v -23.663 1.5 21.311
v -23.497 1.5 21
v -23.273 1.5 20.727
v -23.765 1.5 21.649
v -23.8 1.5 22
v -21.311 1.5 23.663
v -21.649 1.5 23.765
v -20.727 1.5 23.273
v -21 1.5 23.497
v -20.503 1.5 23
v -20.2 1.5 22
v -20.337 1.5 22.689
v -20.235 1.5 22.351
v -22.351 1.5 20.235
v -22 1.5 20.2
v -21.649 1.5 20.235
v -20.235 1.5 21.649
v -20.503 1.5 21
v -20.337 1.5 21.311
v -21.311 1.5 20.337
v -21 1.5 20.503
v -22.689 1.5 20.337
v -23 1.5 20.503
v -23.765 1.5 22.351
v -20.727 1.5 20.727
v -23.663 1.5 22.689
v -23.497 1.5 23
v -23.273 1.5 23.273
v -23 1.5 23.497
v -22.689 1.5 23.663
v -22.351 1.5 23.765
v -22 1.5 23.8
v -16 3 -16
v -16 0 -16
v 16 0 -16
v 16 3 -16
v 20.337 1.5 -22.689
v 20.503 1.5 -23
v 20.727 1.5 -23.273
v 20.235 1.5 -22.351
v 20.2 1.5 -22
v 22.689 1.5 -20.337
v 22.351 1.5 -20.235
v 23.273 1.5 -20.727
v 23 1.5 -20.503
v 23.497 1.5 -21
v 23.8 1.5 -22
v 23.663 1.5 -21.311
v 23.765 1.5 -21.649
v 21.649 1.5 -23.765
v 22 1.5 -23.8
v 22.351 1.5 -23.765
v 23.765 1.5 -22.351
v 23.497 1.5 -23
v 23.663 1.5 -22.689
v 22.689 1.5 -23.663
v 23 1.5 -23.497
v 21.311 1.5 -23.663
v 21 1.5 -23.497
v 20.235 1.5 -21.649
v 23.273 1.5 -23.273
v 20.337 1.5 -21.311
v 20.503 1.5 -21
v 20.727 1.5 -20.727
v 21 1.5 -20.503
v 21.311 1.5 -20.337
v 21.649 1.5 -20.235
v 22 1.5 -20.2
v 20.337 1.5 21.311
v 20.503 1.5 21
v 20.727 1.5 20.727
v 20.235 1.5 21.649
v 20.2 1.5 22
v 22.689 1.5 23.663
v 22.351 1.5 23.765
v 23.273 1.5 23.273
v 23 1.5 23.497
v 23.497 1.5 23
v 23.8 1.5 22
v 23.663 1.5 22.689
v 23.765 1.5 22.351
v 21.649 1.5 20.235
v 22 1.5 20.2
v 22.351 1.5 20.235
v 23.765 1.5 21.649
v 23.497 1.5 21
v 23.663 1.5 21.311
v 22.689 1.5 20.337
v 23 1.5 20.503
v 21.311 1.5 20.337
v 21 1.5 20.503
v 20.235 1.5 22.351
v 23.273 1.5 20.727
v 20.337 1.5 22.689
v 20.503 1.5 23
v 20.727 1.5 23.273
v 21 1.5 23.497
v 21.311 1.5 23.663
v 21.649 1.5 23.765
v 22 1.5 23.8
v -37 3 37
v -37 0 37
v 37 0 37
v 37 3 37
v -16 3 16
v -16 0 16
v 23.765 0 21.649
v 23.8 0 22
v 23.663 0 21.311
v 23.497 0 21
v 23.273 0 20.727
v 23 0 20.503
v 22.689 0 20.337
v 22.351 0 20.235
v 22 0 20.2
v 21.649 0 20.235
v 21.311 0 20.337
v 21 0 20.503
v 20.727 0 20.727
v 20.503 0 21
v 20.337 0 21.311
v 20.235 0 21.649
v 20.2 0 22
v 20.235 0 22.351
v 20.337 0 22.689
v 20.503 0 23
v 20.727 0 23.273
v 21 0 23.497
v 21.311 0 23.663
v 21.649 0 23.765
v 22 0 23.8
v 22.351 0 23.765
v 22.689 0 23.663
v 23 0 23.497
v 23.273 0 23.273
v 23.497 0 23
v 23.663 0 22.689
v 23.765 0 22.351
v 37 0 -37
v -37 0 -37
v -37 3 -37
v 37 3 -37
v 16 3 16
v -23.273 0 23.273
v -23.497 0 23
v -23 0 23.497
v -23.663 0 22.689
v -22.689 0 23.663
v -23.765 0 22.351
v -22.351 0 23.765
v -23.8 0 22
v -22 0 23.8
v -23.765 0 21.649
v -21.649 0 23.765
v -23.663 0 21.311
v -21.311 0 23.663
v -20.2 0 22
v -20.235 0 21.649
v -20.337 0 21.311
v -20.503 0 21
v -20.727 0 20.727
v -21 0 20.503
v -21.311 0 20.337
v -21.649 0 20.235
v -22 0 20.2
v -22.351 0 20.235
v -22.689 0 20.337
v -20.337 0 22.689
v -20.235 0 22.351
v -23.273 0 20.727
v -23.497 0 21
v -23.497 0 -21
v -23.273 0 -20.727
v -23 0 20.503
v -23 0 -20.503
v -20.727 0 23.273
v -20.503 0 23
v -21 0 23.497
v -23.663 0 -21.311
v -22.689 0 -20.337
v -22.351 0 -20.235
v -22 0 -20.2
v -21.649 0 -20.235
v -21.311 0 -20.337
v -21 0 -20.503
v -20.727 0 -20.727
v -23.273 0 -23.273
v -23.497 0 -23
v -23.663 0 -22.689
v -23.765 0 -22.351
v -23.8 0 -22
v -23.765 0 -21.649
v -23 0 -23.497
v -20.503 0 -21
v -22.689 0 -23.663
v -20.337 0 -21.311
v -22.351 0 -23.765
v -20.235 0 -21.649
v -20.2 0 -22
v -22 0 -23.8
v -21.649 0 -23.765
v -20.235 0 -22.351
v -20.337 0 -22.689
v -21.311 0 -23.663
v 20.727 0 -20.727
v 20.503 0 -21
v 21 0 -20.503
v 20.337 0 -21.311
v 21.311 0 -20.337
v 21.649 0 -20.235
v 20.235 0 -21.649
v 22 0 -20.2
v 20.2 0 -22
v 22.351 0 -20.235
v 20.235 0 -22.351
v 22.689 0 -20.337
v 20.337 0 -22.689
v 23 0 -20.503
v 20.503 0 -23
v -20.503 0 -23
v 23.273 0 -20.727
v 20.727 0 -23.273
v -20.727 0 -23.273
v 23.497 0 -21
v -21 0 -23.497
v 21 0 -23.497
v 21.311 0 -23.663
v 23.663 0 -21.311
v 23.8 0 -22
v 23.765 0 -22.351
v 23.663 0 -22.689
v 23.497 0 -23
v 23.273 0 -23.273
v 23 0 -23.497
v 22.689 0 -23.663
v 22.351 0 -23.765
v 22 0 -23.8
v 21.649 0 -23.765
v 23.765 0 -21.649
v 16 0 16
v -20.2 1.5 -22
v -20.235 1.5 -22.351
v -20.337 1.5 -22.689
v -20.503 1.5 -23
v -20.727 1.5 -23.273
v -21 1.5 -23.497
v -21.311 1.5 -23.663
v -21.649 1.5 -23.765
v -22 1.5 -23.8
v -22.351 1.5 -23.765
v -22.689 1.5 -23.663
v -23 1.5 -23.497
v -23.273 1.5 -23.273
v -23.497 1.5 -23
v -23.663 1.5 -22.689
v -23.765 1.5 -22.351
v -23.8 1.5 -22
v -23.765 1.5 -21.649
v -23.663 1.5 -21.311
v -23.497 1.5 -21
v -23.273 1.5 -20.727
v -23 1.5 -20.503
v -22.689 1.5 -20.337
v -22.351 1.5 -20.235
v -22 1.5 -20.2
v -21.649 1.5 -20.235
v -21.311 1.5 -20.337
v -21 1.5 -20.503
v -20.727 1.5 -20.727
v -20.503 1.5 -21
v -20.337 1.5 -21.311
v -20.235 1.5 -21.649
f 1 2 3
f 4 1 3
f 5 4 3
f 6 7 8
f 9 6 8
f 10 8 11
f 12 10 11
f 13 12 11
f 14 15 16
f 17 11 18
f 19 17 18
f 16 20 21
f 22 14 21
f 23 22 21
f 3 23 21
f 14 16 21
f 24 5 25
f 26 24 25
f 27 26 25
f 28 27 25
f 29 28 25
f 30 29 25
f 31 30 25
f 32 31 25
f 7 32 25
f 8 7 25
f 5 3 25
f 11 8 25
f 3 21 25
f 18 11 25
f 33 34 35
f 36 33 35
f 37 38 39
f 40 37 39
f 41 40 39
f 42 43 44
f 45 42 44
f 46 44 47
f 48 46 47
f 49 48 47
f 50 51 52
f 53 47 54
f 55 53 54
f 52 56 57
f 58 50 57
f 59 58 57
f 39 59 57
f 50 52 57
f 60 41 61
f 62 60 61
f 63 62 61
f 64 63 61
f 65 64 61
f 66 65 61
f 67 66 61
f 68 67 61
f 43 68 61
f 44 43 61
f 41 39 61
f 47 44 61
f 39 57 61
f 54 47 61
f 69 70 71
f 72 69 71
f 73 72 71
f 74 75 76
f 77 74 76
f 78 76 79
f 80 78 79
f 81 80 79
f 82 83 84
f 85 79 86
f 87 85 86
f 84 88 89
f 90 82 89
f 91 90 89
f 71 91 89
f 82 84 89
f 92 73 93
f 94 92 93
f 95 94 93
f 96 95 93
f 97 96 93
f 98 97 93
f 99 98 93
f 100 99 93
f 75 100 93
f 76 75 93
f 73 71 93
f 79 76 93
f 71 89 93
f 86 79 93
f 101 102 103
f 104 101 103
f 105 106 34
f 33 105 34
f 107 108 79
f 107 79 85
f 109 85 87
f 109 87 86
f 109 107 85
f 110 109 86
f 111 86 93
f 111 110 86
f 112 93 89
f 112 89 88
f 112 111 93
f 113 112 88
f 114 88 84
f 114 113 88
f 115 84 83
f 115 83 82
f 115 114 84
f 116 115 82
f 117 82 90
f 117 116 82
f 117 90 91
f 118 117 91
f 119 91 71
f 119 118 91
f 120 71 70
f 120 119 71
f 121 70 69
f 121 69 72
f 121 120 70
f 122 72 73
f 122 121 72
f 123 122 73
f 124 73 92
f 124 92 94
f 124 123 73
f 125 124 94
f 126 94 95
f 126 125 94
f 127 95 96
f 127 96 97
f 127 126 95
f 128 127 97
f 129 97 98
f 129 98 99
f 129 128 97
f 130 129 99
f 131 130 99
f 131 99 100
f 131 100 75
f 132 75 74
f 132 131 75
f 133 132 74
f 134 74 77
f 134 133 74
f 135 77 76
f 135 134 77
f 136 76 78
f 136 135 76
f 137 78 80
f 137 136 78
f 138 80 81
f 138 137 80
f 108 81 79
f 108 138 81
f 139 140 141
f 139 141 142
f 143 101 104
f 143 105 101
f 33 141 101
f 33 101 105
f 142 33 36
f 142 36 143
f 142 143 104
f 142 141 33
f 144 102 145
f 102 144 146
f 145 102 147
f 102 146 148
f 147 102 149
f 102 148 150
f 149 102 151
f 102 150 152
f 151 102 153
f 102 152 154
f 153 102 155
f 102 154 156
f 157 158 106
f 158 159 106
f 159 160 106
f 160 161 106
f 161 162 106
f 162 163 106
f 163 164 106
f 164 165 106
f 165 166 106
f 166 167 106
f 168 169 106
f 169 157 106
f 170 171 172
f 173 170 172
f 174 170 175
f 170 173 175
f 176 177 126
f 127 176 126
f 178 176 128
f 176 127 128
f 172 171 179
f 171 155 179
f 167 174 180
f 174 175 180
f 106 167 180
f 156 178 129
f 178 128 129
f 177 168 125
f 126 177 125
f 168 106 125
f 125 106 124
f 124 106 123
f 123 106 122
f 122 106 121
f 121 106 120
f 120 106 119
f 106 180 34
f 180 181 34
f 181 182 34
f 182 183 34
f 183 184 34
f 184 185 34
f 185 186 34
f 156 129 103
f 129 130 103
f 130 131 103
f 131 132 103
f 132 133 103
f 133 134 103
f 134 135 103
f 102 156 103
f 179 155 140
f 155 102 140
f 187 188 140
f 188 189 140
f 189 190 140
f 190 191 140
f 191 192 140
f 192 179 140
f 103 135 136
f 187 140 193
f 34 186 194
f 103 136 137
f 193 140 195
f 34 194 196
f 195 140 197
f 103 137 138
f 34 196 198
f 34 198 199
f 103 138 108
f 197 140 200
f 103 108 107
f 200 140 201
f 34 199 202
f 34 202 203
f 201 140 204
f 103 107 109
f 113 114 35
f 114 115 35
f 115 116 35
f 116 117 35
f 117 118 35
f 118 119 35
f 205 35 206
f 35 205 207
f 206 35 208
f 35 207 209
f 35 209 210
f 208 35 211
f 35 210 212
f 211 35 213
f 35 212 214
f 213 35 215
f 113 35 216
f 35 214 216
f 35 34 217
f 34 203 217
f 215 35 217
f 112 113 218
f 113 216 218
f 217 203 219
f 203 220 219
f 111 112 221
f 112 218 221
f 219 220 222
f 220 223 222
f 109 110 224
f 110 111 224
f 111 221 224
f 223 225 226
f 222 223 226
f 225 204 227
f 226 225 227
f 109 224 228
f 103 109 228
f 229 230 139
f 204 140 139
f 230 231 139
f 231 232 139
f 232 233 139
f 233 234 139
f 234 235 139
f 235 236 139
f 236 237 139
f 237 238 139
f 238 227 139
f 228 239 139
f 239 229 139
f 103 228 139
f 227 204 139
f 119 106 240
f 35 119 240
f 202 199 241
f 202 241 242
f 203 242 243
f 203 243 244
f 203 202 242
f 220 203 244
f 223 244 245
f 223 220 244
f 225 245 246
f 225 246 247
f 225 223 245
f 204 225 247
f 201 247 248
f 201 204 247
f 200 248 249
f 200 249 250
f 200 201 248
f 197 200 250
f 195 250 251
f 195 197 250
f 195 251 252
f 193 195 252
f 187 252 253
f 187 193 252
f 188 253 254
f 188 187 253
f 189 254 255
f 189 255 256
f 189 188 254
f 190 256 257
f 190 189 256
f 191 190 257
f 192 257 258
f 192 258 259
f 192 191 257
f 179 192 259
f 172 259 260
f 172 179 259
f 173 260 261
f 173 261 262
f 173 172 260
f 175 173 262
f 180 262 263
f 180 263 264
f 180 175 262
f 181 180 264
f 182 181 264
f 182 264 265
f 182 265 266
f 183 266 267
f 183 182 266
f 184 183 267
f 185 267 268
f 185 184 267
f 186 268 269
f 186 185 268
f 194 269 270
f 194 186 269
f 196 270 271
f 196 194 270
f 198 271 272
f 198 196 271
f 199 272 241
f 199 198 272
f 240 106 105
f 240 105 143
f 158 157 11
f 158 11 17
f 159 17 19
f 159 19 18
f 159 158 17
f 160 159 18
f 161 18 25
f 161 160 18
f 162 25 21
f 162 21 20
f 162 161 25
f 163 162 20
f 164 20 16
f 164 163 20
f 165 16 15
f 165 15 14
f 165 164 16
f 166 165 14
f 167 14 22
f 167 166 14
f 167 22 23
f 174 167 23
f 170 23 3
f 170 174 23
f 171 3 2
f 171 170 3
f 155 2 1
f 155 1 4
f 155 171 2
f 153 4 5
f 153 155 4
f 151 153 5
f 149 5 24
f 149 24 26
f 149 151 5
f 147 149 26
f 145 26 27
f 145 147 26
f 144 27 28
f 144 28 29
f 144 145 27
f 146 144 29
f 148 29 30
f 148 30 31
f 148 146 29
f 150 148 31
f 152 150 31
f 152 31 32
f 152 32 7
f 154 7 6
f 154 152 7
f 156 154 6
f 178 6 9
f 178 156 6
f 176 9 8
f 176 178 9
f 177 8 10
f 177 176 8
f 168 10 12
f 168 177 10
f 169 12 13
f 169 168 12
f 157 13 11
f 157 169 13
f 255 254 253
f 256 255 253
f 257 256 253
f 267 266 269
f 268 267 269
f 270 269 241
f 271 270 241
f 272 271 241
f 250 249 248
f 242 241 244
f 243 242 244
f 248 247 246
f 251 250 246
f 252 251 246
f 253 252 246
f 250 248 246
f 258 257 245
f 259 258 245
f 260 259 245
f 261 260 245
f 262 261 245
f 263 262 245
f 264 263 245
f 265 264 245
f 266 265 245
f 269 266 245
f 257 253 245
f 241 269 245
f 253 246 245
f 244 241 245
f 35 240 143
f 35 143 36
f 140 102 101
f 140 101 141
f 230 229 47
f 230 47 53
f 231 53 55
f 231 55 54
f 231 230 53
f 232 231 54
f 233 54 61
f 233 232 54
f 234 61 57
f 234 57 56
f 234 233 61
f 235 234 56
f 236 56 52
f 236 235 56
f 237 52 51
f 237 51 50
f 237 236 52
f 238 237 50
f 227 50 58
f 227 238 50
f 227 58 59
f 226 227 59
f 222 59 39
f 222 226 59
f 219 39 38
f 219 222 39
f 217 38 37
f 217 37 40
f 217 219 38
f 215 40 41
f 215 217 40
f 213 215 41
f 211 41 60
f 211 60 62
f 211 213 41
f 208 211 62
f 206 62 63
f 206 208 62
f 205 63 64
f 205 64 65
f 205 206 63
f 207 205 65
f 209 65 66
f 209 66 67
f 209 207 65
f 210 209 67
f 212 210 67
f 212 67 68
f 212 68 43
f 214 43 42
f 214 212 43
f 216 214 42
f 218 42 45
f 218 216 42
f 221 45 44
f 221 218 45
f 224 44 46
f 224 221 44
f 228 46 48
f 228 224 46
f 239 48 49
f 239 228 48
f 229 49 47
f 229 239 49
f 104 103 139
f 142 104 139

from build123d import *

# Parameters (mm, degrees)
SKETCH1_W           = 74
SKETCH1_H           = 74
SKETCH1_W_2         = 32
SKETCH1_H_2         = 32
BOSS_EXTRUDE1_DEPTH = 3
SKETCH3_R           = 1.8
CUT_EXTRUDE1_DEPTH  = 1.5


with BuildPart() as part:
    # Sketch1 → Boss-Extrude1 (new body)
    with BuildSketch(Plane(origin=(0, 0, 0), x_dir=(1, 0, 0), z_dir=(0, 1, 0))):
        Rectangle(SKETCH1_W, SKETCH1_H)
        Rectangle(SKETCH1_W_2, SKETCH1_H_2, mode=Mode.SUBTRACT)
    extrude(amount=BOSS_EXTRUDE1_DEPTH)

    # Sketch3 → Cut-Extrude1 (cut)
    with BuildSketch(Plane(origin=(0, 0, 0), x_dir=(1, 0, 0), z_dir=(0, 1, 0))):
        with Locations((-22, 22)):
            Circle(SKETCH3_R)
        with Locations((22, 22)):
            Circle(SKETCH3_R)
        with Locations((22, -22)):
            Circle(SKETCH3_R)
        with Locations((-22, -22)):
            Circle(SKETCH3_R)
    extrude(amount=CUT_EXTRUDE1_DEPTH, mode=Mode.SUBTRACT)


solid = part.part
